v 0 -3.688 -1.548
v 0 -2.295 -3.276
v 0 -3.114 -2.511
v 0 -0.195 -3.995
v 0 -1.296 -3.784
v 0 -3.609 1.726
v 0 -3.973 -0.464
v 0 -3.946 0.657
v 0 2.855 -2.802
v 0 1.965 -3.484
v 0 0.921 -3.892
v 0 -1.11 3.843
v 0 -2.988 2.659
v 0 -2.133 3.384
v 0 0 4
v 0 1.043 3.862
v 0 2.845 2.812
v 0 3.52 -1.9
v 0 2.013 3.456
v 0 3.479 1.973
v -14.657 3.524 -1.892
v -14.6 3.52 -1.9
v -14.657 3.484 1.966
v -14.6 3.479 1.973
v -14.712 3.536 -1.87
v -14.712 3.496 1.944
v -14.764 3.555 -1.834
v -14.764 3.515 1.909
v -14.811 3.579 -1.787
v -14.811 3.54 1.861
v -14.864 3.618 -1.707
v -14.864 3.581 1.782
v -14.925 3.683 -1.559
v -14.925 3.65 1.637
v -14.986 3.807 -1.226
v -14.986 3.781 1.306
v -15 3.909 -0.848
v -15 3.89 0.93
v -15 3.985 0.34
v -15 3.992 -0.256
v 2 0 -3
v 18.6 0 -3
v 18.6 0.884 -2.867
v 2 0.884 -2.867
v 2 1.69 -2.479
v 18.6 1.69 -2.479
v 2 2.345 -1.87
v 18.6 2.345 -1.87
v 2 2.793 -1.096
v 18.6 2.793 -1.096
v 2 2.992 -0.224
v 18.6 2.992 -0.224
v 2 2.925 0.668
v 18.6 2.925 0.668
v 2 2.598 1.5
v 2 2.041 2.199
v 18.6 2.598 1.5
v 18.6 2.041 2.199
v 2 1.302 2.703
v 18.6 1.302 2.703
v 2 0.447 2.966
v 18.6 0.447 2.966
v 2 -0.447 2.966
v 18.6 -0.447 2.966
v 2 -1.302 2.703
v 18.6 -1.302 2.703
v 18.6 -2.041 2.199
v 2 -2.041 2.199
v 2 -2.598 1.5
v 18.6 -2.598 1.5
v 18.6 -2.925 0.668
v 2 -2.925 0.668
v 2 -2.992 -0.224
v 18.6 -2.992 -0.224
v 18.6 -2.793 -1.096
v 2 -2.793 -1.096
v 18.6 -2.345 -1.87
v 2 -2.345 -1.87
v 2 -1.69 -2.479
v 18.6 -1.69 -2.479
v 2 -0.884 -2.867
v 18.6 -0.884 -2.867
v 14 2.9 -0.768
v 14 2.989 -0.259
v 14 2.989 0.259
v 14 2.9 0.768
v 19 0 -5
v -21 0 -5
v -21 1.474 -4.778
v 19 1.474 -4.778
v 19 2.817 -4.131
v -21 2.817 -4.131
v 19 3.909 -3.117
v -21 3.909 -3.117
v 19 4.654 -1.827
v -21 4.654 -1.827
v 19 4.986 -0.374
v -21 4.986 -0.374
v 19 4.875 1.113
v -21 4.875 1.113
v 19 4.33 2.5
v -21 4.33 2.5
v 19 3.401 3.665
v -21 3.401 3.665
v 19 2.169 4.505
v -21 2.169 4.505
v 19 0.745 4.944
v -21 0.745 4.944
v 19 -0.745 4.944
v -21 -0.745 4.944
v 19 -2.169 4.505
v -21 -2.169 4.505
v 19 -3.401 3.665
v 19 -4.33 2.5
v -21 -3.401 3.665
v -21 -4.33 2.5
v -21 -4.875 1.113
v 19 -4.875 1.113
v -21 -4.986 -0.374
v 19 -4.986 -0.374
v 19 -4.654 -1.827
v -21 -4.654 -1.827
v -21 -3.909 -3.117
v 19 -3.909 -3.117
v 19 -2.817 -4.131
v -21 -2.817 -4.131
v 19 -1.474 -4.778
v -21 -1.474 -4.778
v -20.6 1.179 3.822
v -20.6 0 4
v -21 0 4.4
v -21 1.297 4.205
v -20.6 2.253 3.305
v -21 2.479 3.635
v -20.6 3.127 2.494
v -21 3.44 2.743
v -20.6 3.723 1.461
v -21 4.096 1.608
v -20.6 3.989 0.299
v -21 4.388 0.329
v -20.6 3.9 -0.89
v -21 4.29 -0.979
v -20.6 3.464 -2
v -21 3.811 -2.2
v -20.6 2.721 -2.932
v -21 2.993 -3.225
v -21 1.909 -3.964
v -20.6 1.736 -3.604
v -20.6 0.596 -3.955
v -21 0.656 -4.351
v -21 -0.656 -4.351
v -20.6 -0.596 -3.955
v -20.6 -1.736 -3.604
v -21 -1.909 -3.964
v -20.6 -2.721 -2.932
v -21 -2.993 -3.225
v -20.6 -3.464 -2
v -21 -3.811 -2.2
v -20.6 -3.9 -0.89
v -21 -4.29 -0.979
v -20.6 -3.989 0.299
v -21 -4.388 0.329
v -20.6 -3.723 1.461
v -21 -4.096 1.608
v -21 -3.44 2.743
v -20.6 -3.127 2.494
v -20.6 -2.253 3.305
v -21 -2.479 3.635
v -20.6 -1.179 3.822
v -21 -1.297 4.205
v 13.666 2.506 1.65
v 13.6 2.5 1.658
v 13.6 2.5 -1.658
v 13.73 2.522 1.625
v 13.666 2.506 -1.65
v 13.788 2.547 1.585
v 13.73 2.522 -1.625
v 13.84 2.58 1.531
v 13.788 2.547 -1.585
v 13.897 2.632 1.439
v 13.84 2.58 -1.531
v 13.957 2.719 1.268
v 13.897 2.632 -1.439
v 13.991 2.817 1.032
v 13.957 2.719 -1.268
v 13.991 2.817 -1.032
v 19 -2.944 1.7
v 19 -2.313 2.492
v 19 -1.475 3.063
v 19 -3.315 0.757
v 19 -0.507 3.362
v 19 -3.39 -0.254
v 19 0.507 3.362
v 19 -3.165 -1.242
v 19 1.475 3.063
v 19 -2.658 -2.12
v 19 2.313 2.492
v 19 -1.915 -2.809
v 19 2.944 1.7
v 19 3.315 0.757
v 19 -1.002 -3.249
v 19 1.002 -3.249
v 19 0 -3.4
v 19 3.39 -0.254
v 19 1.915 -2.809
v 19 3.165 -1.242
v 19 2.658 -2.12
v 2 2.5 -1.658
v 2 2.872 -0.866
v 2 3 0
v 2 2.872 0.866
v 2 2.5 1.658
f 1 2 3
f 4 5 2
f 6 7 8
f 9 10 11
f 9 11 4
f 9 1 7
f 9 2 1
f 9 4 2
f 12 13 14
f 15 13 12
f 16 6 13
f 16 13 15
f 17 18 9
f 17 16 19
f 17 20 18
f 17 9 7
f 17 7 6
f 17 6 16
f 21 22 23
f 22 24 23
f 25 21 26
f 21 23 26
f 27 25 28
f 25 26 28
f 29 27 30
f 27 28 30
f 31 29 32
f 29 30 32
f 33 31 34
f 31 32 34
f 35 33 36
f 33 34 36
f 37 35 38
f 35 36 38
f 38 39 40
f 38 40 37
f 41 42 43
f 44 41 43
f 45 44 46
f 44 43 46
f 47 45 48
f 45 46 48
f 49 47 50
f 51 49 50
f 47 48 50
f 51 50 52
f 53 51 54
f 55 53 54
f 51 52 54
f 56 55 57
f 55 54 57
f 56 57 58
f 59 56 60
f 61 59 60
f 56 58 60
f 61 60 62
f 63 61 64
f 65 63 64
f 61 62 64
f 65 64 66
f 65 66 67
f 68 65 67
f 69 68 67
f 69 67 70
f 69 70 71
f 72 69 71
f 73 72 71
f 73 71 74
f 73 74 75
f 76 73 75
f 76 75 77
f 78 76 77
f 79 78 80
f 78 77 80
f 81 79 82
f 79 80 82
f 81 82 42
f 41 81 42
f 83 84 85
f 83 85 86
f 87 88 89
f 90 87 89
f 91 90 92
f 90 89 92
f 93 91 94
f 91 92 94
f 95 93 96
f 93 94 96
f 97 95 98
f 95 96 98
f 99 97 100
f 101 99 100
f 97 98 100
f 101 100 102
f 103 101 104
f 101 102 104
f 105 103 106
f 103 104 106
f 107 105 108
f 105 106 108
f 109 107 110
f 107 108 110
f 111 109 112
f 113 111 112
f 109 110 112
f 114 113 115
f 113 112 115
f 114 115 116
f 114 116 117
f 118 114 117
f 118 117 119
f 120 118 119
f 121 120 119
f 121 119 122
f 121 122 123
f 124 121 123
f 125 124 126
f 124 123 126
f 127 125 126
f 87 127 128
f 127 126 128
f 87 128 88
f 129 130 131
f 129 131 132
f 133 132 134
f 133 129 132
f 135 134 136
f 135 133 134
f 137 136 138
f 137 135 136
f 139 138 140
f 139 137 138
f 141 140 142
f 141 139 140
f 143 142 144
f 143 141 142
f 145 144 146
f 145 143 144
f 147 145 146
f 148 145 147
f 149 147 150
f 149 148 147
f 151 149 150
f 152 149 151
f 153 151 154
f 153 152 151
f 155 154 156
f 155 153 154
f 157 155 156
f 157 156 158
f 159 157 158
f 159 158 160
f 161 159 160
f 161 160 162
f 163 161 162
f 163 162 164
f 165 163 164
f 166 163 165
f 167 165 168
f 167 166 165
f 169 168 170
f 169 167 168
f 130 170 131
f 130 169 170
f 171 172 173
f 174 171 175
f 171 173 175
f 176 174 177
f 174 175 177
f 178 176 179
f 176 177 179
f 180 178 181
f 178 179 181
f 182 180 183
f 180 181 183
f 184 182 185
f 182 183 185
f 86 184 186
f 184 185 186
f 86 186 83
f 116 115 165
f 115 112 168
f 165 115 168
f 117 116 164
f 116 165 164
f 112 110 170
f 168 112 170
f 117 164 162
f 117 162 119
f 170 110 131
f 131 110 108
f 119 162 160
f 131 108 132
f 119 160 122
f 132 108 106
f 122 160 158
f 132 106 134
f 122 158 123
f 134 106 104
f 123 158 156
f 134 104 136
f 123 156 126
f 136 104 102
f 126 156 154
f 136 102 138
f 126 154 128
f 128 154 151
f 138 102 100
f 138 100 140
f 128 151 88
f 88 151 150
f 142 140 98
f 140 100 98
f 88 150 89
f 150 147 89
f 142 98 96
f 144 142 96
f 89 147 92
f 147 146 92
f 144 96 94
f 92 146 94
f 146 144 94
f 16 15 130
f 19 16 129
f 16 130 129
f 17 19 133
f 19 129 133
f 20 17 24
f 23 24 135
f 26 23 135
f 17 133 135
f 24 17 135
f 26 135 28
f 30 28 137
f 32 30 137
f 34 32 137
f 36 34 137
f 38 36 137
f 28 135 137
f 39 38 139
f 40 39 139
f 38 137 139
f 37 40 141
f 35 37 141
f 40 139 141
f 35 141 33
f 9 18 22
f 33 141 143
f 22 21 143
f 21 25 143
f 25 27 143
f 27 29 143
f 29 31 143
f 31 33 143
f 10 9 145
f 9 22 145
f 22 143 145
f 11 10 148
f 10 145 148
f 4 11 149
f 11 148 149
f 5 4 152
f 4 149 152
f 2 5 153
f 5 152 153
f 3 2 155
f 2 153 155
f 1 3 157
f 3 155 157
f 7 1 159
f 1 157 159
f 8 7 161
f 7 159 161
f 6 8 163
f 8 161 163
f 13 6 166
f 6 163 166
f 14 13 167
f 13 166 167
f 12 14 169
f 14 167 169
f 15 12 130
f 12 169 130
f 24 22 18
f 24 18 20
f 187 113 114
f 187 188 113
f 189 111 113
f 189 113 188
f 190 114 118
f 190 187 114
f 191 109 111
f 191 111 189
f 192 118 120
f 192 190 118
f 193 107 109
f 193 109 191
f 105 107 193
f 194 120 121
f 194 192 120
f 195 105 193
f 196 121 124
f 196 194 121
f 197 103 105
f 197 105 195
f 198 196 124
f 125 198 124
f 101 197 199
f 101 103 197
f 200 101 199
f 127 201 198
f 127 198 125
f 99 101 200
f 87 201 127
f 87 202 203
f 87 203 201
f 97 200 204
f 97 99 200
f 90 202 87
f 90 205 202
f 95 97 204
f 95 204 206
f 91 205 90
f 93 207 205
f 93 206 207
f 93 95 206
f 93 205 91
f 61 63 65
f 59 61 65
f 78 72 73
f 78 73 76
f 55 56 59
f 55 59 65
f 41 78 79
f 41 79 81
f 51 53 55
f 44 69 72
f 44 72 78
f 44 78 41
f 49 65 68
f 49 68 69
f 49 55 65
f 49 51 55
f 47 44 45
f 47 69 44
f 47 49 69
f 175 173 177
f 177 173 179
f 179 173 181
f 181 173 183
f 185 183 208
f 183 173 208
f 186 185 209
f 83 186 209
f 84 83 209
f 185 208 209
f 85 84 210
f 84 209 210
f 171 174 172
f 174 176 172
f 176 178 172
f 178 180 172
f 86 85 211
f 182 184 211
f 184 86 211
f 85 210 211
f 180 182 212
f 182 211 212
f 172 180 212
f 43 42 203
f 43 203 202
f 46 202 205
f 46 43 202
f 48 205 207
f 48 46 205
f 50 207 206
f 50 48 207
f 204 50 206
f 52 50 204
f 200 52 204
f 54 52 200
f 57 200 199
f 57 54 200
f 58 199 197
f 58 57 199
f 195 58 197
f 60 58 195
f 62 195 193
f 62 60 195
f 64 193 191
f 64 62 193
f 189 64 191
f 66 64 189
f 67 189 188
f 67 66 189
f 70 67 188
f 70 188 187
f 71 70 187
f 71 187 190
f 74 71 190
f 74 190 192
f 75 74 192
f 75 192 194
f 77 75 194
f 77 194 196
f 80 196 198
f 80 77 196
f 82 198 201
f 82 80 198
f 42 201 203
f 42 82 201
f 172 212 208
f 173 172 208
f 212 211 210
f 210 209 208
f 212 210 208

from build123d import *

# Parameters (mm, degrees)
EXTRUDE_1_DEPTH      = 19
EXTRUDE_1_DEPTH_BACK = 21
SKETCH_1_R           = 5
SKETCH_3_R           = 3
CUT_EXTRUDE_1_DEPTH  = 17
SKETCH_4_R           = 4
CUT_EXTRUDE_2_DEPTH  = 21
EXTRUDE_2_DEPTH      = 12
EXTRUDE_START        = 15
EXTRUDE_3_DEPTH      = 15
CHAMFER_1_SIZE       = 0.4
FILLET_1_R           = 0.4
FILLET_2_R           = 0.4


with BuildPart() as part:
    # 草图1 → 凸台-拉伸1 (new, two sides: drawn at the far end of the back side and taken through both)
    with BuildSketch(Plane(origin=(0, 0, 0), x_dir=(0, 0, -1), z_dir=(1, 0, 0)).offset(-EXTRUDE_1_DEPTH_BACK)):
        Circle(SKETCH_1_R)
    extrude(amount=EXTRUDE_1_DEPTH + EXTRUDE_1_DEPTH_BACK)

    # 草图3 → 切除-拉伸1 (cut)
    with BuildSketch(Plane(origin=(19, 0, 0), x_dir=(0, 0, -1), z_dir=(1, 0, 0))):
        Circle(SKETCH_3_R)
    extrude(amount=-CUT_EXTRUDE_1_DEPTH, mode=Mode.SUBTRACT)

    # 草图4 → 切除-拉伸2 (cut)
    with BuildSketch(Plane.ZY.offset(21)):
        Circle(SKETCH_4_R)
    extrude(amount=-CUT_EXTRUDE_2_DEPTH, mode=Mode.SUBTRACT)

    # 草图6 → 凸台-拉伸3 (add)
    with BuildSketch(Plane.ZY.offset(EXTRUDE_START)):
        with BuildLine():
            Line((-1.899540758, 3.520191033), (1.973227995, 3.479421113))
            ThreePointArc((1.973227995, 3.479421113), (0.042106993, 3.999778369), (-1.899540758, 3.520191033))
        make_face()
    extrude(amount=-EXTRUDE_3_DEPTH)

    # 倒角1
    chamfer_1_edges = [part.edges().sort_by_distance(p)[0] for p in [
        (-21, 0, -4),
        (19, 0, 3),
    ]]
    chamfer(chamfer_1_edges, length=CHAMFER_1_SIZE)

    # 圆角2
    fillet_2_edges = [part.edges().sort_by_distance(p)[0] for p in [
        (-15, 3.499806073, 0.036843619),
    ]]
    fillet(fillet_2_edges, radius=FILLET_2_R)


with BuildPart() as body_2:
    # 草图5 → 凸台-拉伸2 (new body)
    with BuildSketch(Plane(origin=(2, 0, 0), x_dir=(0, 0, -1), z_dir=(1, 0, 0))):
        with BuildLine():
            Line((-1.658312395, 2.5), (1.658312395, 2.5))
            ThreePointArc((1.658312395, 2.5), (0, 3), (-1.658312395, 2.5))
        make_face()
    extrude(amount=EXTRUDE_2_DEPTH)

    # 圆角1
    fillet_1_edges = [body_2.edges().sort_by_distance(p)[0] for p in [
        (14, 2.5, 0),
    ]]
    fillet(fillet_1_edges, radius=FILLET_1_R)


solid = Compound([part.part, body_2.part])
